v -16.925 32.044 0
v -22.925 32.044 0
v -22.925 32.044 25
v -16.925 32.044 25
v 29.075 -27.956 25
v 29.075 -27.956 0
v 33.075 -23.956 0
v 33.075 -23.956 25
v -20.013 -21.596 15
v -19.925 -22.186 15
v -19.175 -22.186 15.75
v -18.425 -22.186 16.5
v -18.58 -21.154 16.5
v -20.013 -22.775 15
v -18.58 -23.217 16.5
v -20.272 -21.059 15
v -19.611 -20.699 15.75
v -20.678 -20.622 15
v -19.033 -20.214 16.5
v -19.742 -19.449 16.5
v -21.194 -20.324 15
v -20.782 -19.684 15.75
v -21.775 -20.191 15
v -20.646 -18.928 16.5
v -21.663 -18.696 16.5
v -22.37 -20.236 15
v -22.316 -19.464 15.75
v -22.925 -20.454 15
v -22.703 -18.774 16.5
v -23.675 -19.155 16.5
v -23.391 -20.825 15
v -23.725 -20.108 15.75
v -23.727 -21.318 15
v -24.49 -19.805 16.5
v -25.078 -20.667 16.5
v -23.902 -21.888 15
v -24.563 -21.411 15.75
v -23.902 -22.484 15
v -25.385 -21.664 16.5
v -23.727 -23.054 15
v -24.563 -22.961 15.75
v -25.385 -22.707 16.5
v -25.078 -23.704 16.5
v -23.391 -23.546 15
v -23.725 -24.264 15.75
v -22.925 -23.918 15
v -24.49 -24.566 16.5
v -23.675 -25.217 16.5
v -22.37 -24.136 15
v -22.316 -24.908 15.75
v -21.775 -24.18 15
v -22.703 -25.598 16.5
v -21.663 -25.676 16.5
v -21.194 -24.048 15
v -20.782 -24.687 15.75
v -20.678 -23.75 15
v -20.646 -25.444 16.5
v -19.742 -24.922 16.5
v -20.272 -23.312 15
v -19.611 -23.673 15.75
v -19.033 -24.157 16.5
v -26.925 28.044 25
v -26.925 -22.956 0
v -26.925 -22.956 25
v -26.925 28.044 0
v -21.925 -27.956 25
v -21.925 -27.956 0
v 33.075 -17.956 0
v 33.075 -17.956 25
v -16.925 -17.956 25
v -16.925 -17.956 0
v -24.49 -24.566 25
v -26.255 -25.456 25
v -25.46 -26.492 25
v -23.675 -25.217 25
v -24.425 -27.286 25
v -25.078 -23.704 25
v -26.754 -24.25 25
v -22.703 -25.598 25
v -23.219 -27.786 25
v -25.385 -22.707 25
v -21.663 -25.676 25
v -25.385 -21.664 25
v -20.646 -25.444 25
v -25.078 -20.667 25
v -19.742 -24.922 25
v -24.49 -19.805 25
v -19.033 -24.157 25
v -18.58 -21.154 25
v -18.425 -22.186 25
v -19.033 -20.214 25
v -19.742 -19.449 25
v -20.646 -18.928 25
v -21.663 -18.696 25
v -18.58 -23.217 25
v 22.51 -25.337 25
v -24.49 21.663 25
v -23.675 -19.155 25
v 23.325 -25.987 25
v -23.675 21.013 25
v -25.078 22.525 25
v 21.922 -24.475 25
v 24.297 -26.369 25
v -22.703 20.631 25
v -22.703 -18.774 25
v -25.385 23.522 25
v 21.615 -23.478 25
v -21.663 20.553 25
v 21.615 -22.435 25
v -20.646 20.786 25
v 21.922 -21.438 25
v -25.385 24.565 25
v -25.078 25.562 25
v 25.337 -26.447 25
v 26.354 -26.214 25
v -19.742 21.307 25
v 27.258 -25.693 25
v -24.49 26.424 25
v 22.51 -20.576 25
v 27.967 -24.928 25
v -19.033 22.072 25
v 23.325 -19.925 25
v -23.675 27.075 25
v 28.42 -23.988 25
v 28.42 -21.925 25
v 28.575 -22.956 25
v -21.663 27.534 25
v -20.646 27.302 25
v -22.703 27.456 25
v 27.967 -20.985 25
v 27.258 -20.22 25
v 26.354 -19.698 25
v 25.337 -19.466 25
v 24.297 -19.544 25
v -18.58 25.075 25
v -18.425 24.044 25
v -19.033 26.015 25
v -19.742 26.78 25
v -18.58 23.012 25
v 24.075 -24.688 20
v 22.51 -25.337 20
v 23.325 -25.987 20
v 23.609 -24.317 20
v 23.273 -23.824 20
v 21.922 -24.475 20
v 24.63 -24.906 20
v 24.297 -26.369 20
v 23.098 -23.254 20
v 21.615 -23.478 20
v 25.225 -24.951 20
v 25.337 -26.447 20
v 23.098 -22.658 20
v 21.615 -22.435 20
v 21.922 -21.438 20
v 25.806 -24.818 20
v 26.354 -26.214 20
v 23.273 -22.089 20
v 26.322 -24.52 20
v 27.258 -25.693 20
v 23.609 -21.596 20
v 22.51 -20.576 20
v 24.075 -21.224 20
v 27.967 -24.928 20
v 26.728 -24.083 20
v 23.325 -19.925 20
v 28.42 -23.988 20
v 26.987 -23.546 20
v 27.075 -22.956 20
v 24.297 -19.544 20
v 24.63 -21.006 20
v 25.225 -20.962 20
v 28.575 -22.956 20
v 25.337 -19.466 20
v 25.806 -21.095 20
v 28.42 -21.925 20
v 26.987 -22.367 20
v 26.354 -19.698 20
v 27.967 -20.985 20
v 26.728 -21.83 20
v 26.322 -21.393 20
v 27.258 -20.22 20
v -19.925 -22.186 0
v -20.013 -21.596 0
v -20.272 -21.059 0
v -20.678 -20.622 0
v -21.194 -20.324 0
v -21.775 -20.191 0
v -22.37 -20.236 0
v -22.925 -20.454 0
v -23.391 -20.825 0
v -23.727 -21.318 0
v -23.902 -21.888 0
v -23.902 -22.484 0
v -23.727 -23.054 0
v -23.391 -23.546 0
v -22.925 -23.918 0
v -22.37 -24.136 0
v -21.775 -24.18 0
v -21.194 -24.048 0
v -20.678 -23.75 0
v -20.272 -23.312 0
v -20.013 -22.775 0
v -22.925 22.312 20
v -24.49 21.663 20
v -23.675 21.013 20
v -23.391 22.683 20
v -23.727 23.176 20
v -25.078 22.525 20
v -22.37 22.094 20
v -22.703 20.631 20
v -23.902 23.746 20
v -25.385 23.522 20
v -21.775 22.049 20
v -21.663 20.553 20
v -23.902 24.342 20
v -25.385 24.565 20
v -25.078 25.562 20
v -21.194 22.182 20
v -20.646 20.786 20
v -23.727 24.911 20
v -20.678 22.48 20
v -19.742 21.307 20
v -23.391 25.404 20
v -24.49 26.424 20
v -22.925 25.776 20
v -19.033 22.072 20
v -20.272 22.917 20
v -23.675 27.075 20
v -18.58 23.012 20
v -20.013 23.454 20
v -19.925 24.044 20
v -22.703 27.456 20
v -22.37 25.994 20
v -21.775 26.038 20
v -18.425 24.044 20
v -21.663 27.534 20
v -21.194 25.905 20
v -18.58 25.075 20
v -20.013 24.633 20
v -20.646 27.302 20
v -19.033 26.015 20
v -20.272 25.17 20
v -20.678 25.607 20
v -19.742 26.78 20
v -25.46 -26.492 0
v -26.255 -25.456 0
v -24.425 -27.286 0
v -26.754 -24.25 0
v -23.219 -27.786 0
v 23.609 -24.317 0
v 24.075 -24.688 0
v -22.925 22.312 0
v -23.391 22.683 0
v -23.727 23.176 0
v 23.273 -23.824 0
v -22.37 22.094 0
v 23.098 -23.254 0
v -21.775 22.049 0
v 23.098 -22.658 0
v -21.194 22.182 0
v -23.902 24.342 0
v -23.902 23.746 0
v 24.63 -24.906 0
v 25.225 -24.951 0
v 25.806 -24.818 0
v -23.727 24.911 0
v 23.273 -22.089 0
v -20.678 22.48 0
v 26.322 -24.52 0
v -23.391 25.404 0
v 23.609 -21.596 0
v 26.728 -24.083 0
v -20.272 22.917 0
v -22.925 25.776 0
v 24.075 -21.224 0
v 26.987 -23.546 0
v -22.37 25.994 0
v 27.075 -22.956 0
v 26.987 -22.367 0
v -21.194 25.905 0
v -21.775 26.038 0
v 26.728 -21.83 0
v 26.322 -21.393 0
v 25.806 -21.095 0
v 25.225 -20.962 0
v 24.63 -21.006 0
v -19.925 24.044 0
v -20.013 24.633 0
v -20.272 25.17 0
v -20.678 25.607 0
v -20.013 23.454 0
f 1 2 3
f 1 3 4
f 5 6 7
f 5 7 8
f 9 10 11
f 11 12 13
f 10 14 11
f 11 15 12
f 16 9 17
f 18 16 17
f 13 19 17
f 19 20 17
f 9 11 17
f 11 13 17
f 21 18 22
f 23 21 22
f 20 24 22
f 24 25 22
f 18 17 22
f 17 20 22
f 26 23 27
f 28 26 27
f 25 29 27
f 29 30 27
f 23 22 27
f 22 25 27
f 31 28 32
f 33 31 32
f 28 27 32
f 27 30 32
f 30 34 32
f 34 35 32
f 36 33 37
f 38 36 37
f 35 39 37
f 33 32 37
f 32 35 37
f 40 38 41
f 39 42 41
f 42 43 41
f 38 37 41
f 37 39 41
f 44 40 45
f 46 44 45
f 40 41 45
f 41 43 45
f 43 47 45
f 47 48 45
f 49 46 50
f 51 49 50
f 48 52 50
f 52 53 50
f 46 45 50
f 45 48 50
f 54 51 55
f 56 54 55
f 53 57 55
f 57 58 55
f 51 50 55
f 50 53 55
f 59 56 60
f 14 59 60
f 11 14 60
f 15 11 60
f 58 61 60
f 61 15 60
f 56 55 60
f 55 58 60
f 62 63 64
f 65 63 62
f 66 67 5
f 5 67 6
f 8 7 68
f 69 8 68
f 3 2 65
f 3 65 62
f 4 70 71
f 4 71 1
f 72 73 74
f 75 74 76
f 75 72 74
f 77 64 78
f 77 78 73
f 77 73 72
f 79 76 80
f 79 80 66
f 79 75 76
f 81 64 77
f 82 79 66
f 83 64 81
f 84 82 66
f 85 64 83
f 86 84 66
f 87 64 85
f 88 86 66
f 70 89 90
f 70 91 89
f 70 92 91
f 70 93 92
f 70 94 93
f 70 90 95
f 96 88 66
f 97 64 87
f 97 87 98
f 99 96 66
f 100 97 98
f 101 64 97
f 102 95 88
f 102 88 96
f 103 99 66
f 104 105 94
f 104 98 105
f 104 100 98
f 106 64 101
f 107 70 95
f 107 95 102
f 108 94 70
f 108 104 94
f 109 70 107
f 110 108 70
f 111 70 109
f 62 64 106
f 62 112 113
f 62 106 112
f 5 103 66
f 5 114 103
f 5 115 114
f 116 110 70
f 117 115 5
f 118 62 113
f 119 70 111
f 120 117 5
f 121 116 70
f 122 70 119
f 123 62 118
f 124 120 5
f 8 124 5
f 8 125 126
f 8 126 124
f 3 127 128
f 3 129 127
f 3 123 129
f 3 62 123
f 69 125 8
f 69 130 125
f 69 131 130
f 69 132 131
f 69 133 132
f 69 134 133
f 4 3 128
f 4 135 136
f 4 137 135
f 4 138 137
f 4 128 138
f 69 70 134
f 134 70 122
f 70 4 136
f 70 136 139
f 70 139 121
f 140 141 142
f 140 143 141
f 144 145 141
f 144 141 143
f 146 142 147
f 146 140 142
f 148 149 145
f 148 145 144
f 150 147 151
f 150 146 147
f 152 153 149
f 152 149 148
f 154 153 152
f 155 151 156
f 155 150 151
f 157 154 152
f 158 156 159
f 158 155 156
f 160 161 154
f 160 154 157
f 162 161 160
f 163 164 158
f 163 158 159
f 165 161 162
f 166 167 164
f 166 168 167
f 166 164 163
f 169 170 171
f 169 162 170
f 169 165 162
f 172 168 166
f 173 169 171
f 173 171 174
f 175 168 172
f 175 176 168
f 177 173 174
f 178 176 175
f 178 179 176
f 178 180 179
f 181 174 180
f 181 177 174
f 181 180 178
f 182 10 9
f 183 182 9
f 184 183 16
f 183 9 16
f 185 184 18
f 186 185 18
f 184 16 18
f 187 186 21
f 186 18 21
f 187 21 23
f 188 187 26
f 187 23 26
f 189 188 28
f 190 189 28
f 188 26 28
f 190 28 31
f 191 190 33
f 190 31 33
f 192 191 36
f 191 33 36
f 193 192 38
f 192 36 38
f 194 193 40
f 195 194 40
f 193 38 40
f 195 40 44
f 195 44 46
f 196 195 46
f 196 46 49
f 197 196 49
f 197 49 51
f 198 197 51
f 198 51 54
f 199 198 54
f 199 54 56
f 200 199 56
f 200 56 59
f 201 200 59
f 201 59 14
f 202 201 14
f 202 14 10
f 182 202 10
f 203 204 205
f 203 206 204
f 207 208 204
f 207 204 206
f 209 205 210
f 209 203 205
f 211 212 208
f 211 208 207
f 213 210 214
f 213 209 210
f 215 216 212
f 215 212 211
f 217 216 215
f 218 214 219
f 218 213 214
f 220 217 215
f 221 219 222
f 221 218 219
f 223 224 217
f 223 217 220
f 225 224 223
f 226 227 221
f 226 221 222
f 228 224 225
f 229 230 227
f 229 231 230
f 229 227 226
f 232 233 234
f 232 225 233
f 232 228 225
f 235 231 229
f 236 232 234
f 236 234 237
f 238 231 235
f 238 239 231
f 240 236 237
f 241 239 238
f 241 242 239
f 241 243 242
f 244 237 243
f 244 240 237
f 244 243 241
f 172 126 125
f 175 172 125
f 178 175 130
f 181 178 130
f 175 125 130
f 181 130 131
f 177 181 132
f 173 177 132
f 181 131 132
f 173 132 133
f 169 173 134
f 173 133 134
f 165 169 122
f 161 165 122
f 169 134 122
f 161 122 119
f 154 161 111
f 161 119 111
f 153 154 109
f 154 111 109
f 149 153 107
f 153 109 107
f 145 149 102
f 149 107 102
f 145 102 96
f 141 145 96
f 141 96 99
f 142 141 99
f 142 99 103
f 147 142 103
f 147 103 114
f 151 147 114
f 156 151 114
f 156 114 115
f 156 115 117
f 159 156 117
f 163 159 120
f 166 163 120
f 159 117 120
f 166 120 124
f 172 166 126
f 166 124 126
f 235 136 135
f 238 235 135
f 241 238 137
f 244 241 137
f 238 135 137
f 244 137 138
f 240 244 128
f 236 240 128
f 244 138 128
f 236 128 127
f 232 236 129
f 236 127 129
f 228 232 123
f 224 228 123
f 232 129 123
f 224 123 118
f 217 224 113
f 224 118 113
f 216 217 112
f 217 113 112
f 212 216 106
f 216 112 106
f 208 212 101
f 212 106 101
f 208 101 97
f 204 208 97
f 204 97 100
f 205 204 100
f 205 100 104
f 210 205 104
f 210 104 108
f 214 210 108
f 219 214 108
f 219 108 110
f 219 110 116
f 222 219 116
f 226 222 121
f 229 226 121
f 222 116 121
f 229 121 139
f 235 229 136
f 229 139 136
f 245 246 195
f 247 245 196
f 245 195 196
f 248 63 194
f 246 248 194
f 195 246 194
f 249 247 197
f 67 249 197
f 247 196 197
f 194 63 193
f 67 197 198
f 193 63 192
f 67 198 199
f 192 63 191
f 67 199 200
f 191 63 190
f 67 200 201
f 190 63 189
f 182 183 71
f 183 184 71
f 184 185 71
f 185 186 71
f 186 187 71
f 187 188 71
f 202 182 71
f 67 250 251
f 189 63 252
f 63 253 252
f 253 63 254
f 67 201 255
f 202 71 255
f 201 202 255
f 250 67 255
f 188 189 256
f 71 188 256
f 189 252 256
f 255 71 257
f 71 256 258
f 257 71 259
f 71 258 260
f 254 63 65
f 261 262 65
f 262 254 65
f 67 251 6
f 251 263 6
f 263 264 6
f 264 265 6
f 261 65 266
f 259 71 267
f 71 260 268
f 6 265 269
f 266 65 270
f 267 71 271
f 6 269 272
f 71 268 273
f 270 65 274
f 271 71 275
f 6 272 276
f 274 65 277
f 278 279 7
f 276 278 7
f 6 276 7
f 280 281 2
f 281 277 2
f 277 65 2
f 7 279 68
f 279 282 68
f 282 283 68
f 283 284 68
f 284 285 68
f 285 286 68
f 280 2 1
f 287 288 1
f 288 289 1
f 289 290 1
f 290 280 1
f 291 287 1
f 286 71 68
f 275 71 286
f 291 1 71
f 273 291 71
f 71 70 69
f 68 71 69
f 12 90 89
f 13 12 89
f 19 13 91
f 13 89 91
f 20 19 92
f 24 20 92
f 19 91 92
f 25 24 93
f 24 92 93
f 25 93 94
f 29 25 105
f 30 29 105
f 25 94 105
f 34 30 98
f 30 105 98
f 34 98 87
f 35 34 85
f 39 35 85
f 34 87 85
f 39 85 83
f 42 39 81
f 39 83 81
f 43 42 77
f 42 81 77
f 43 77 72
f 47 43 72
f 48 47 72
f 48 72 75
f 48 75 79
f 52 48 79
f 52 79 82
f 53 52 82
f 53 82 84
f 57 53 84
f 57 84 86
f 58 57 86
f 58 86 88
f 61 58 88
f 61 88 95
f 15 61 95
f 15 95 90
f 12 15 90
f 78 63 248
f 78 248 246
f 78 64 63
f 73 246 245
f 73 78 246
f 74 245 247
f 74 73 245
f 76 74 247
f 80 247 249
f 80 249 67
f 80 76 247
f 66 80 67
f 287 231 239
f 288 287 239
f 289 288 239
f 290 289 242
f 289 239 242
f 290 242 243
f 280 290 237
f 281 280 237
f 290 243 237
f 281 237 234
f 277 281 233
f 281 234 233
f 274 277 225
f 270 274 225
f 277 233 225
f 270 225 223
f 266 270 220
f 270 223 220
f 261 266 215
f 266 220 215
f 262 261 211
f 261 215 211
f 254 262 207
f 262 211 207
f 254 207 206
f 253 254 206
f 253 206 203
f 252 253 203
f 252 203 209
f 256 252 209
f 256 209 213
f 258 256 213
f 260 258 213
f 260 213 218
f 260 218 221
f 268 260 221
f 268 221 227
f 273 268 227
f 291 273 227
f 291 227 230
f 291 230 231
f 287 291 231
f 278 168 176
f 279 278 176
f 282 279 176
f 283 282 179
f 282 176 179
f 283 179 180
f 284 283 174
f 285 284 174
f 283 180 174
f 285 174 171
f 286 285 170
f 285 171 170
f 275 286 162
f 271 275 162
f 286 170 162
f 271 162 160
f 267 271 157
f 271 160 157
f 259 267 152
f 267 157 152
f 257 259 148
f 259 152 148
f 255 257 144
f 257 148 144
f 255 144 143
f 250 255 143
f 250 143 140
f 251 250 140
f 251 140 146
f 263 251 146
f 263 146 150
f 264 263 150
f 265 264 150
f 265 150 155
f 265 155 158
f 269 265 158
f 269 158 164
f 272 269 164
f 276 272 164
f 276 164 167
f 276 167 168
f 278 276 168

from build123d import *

# Parameters (mm, degrees)
F0_W        = 60
F0_H        = 60
F1_DEPTH    = 25
F2_W        = 50
F2_H        = 50
F3_DEPTH    = 25
F4_R        = 5
F5_R        = 2
F6_DEPTH    = 28
F7_R        = 3.5
F8_DEPTH    = 5
F9_S5_R     = 3.5
F9_T6_DEPTH = 12
F10_SIZE    = 4


# Not quite as in the source:
# - a fillet or chamfer that OpenCascade refuses, or shapes differently, is made with other operations: its cross-section is extruded or revolved along the edge and cut away or added


with BuildPart() as f1:
    # F0 (on Top) → F1 (new body)
    with BuildSketch(Plane.XY):
        with Locations((3.075433895, 2.043666031)):
            Rectangle(F0_W, F0_H)
    extrude(amount=F1_DEPTH)

    # F2 (on face) → F3 (cut)
    with BuildSketch(Plane.XY.offset(25)):
        with Locations((8.075433895, 7.043666031)):
            Rectangle(F2_W, F2_H)
    extrude(amount=-F3_DEPTH, mode=Mode.SUBTRACT)

    # F4
    f4_edges = [f1.edges().sort_by_distance(p)[0] for p in [
        (-26.924566, -27.956334, 12.5),
    ]]
    fillet(f4_edges, radius=F4_R)

    # F5 (on face) → F6 (cut)
    with BuildSketch(Plane.XY.offset(25)):
        with Locations((-21.924566105, 24.043666031)):
            Circle(F5_R)
        with Locations((-21.924566105, -22.1858429265)):
            Circle(F5_R)
        with Locations((25.075433895, -22.956333969)):
            Circle(F5_R)
    extrude(amount=-F6_DEPTH, mode=Mode.SUBTRACT)

    # F7 (on face) → F8 (cut)
    with BuildSketch(Plane.XY.offset(25)):
        with Locations((-21.924566105, 24.043666031)):
            Circle(F7_R)
        with Locations((25.075433895, -22.956333969)):
            Circle(F7_R)
        with Locations((-21.924566105, -22.1858429265)):
            Circle(F7_R)
    extrude(amount=-F8_DEPTH, mode=Mode.SUBTRACT)

    # F9: chamfer of 5 on 1 edges, made by hand


with BuildPart() as f9_tool2:
    # F9_s3 → F9_t4 (revolve)
    with BuildSketch(Plane.XZ.offset(22.1858429265)):
        Polygon((-19.924566105, 15), (-14.924566105, 20), (-19.924566105, 20), align=None)
    revolve(axis=Axis((-21.924566105, -22.1858429265, 20), (0, 0, 1)))

    # F9_s5 → F9_t6 (intersect, symmetric)
    with BuildSketch(Plane.XY.offset(17.5)):
        with Locations((-21.924566105, -22.1858429265)):
            Circle(F9_S5_R)
    extrude(amount=F9_T6_DEPTH, both=True, mode=Mode.INTERSECT)


with BuildPart() as f1_1:
    add(f1.part)

    # F9_t1: cut F9_tool2
    add(f9_tool2.part, mode=Mode.SUBTRACT)

    # F10
    f10_edges = [f1_1.edges().sort_by_distance(p)[0] for p in [
        (-26.924566, 32.043666, 12.5),
        (33.075434, -27.956334, 12.5),
    ]]
    chamfer(f10_edges, length=F10_SIZE)


solid = f1_1.part
